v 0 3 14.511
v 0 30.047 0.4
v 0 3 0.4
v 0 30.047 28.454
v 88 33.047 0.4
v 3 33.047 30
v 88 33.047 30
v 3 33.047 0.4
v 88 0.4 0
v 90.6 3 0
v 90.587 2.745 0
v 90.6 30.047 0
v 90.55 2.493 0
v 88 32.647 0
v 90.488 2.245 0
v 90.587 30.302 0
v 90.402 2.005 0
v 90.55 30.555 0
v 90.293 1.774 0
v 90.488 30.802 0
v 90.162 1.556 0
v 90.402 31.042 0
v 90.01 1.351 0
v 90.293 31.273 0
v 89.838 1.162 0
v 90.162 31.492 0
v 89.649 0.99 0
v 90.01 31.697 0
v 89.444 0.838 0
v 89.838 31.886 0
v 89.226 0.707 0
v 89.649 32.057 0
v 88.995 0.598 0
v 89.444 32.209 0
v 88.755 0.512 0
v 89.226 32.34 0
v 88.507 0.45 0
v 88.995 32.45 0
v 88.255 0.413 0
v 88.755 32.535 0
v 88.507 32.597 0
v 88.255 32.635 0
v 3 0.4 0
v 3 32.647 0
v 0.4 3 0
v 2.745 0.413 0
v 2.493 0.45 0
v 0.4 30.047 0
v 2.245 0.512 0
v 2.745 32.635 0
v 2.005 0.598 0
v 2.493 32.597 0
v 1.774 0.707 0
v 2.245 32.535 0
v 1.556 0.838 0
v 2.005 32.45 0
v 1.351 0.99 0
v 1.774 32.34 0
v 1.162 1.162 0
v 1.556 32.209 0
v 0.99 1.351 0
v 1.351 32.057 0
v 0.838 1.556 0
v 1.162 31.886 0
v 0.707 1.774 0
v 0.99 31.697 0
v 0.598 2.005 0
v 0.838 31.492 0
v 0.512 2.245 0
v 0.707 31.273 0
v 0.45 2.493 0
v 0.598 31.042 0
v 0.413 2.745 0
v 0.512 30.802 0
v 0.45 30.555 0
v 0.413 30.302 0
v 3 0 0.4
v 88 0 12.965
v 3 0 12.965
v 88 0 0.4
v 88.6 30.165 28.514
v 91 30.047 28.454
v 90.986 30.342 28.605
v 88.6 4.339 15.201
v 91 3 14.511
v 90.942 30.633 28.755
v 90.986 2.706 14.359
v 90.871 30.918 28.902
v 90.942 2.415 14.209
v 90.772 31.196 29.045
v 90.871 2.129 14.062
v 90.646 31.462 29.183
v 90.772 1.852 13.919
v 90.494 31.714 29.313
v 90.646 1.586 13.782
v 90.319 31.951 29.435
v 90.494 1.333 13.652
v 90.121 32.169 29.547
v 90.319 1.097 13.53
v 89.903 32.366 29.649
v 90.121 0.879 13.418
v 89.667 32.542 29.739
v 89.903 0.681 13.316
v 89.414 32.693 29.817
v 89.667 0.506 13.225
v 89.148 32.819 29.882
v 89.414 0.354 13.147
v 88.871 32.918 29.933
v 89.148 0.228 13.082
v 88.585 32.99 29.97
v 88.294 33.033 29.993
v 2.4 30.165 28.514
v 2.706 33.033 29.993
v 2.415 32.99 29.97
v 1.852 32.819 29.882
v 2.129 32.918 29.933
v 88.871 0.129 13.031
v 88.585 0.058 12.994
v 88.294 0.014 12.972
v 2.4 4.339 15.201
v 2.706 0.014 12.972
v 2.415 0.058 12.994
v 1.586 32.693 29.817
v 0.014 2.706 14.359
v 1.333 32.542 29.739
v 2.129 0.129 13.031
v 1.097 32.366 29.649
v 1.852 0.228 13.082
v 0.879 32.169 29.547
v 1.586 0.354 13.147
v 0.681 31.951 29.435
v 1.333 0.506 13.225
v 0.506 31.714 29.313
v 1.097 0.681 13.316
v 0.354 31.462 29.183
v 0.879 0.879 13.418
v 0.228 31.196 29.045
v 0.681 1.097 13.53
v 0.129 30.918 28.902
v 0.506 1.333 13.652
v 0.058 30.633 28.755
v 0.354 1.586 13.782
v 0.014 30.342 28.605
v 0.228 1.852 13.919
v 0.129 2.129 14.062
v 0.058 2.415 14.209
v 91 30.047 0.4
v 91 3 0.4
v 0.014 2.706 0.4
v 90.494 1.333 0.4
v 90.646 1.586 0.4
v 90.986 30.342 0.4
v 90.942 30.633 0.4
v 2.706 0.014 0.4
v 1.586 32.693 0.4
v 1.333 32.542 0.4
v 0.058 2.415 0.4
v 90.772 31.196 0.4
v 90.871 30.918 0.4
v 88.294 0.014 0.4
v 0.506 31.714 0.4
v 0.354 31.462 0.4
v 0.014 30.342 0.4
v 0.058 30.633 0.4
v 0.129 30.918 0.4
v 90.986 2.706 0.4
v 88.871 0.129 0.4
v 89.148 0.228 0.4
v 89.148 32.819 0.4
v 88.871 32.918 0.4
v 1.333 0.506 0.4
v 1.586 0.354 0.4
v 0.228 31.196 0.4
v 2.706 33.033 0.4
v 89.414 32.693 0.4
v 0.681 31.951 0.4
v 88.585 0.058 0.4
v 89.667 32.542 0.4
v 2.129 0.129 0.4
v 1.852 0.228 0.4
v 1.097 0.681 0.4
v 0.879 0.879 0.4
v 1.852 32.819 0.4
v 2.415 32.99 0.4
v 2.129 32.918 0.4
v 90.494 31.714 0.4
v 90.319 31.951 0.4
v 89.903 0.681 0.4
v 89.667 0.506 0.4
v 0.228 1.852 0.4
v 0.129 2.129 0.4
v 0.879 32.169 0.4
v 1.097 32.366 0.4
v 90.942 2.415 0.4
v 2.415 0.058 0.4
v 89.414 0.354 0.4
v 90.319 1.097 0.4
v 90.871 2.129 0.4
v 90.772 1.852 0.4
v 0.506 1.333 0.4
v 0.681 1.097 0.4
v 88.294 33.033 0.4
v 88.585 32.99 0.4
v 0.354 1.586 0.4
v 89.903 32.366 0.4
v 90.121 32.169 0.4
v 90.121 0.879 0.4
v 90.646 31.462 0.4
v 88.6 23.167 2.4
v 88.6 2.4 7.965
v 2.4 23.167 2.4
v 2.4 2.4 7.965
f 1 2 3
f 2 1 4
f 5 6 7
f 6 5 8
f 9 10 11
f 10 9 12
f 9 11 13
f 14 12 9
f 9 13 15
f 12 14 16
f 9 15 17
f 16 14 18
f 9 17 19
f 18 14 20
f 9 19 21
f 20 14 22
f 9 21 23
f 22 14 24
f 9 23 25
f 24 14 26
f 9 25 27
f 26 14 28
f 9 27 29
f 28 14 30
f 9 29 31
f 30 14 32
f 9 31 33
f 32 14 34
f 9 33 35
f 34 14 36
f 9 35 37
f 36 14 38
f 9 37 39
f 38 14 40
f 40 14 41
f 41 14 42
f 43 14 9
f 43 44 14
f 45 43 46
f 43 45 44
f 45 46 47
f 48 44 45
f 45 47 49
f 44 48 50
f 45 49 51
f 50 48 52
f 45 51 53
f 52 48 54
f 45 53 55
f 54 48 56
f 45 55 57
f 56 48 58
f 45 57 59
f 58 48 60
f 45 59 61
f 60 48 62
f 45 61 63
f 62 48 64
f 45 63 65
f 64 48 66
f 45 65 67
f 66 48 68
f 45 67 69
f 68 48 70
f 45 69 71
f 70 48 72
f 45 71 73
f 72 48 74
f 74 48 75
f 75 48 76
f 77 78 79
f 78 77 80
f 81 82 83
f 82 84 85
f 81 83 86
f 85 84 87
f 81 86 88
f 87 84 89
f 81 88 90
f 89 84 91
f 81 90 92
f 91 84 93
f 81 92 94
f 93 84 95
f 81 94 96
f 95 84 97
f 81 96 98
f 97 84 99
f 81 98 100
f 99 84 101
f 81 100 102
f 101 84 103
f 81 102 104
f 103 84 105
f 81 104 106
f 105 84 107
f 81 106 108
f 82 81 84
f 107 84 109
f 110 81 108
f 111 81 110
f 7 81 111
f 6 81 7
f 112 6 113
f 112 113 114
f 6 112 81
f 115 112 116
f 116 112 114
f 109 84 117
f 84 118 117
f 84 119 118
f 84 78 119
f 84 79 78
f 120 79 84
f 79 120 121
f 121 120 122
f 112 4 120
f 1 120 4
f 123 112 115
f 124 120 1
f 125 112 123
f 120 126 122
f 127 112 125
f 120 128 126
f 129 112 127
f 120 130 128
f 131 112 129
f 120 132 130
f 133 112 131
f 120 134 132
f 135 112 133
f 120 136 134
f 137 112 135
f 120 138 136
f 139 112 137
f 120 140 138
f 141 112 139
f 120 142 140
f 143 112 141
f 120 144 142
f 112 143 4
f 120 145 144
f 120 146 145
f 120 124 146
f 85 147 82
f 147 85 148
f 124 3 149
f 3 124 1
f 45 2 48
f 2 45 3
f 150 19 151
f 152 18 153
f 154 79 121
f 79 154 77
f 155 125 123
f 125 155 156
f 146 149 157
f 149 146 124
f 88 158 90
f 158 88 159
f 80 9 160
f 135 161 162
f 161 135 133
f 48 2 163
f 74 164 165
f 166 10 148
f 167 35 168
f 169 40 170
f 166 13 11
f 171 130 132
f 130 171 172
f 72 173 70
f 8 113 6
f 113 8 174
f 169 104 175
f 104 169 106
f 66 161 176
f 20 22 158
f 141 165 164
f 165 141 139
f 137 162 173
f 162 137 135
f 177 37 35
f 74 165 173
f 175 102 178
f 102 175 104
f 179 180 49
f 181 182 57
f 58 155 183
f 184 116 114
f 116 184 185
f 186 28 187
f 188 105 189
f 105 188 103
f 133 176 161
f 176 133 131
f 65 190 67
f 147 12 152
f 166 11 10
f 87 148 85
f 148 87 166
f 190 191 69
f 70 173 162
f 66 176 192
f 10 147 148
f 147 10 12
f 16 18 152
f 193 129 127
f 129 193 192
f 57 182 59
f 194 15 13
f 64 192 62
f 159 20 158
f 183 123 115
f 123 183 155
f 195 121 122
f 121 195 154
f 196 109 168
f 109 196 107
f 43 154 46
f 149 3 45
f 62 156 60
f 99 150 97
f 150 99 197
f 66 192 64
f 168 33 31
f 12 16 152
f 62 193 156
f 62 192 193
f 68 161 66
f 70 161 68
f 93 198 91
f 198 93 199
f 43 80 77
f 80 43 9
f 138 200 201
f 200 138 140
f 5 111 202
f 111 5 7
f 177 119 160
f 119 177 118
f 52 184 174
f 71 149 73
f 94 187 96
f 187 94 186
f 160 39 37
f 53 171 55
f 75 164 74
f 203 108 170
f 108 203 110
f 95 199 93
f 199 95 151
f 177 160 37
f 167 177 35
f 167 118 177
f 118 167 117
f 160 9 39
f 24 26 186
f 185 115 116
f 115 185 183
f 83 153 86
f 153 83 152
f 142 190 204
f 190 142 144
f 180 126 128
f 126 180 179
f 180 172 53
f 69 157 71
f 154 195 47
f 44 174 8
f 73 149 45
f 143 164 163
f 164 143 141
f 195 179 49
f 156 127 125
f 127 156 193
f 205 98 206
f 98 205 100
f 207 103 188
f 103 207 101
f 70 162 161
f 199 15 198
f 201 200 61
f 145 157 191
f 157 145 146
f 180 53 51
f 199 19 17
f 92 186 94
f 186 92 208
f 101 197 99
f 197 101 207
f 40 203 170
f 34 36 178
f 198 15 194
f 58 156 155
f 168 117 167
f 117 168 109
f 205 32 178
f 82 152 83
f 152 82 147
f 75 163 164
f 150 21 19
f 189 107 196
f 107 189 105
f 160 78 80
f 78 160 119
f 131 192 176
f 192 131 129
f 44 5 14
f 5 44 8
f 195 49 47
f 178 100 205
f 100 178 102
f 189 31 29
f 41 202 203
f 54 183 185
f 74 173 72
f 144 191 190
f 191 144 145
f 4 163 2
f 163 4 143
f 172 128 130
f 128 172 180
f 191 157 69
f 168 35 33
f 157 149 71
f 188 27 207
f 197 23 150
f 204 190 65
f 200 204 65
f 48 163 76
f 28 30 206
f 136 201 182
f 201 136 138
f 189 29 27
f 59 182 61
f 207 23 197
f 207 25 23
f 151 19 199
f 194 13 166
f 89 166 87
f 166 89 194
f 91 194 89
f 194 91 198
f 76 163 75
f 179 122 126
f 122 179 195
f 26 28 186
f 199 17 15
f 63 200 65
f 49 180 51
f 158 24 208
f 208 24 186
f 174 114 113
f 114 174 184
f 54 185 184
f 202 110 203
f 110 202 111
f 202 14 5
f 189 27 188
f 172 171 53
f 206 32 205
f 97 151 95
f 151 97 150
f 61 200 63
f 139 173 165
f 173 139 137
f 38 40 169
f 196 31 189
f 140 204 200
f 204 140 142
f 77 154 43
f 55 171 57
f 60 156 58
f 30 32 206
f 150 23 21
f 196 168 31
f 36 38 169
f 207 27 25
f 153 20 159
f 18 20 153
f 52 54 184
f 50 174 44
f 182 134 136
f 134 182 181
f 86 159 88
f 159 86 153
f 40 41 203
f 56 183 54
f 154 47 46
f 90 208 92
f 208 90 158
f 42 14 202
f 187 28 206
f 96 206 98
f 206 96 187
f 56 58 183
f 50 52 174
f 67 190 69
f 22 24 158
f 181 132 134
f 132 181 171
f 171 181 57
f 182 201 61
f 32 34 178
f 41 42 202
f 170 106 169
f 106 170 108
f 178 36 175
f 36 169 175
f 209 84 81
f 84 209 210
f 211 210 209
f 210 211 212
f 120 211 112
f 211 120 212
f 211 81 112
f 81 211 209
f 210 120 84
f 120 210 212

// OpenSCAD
// Desk stand for a stack of 3D-printed business cards.
// Cards stand on their long edge and lean back. Print upright, no supports.

/* [Cards] */
card_width     = 85;
card_height    = 55;
card_thickness = 2;
card_count     = 10;

/* [Fit] */
width_clearance = 0.6;  // per side
stack_clearance = 1.5;  // total, front to back

/* [Holder] */
tilt         = 15;   // degrees the cards lean back from vertical
wall         = 2.4;  // six 0.4 mm lines
floor_height = 2.4;  // at the lowest point of the pocket
front_lip    = 5;    // covers only the card border, so the front card stays readable
back_height  = 30;   // supports a bit more than half the card height
corner_radius = 3;
chamfer       = 0.4;  // bottom edge, counters first-layer squish

inner_w = card_width + 2 * width_clearance;
inner_d = card_count * card_thickness + stack_clearance;
outer_w = inner_w + 2 * wall;

// Pocket corners in the side profile (y = depth, z = height).
// The pocket floor is perpendicular to the cards, so it slopes down towards the back.
p_front = [wall, floor_height + inner_d * sin(tilt)];
p_back  = [wall + inner_d * cos(tilt), floor_height];

front_top_z = p_front[1] + front_lip;
outer_d     = p_back[0] + (back_height - floor_height) * tan(tilt) + wall / cos(tilt);

assert(back_height > front_top_z, "back_height must exceed the front wall height");

$fn = 64;

module rounded_rect(w, h, r) {
    offset(r = r) offset(delta = -r) square([w, h]);
}

module side_profile() {
    polygon([[0, 0], [0, front_top_z], [outer_d, back_height], [outer_d, 0]]);
}

module footprint_prism() {
    hull() {
        translate([chamfer, chamfer, 0])
            linear_extrude(back_height)
                rounded_rect(outer_w - 2 * chamfer, outer_d - 2 * chamfer, corner_radius - chamfer);
        translate([0, 0, chamfer])
            linear_extrude(back_height - chamfer)
                rounded_rect(outer_w, outer_d, corner_radius);
    }
}

module pocket() {
    translate([wall, p_front[0], p_front[1]])
        rotate([-tilt, 0, 0])
            cube([inner_w, inner_d, 2 * card_height]);
}

difference() {
    intersection() {
        rotate([90, 0, 90]) linear_extrude(outer_w) side_profile();
        footprint_prism();
    }
    pocket();
}
